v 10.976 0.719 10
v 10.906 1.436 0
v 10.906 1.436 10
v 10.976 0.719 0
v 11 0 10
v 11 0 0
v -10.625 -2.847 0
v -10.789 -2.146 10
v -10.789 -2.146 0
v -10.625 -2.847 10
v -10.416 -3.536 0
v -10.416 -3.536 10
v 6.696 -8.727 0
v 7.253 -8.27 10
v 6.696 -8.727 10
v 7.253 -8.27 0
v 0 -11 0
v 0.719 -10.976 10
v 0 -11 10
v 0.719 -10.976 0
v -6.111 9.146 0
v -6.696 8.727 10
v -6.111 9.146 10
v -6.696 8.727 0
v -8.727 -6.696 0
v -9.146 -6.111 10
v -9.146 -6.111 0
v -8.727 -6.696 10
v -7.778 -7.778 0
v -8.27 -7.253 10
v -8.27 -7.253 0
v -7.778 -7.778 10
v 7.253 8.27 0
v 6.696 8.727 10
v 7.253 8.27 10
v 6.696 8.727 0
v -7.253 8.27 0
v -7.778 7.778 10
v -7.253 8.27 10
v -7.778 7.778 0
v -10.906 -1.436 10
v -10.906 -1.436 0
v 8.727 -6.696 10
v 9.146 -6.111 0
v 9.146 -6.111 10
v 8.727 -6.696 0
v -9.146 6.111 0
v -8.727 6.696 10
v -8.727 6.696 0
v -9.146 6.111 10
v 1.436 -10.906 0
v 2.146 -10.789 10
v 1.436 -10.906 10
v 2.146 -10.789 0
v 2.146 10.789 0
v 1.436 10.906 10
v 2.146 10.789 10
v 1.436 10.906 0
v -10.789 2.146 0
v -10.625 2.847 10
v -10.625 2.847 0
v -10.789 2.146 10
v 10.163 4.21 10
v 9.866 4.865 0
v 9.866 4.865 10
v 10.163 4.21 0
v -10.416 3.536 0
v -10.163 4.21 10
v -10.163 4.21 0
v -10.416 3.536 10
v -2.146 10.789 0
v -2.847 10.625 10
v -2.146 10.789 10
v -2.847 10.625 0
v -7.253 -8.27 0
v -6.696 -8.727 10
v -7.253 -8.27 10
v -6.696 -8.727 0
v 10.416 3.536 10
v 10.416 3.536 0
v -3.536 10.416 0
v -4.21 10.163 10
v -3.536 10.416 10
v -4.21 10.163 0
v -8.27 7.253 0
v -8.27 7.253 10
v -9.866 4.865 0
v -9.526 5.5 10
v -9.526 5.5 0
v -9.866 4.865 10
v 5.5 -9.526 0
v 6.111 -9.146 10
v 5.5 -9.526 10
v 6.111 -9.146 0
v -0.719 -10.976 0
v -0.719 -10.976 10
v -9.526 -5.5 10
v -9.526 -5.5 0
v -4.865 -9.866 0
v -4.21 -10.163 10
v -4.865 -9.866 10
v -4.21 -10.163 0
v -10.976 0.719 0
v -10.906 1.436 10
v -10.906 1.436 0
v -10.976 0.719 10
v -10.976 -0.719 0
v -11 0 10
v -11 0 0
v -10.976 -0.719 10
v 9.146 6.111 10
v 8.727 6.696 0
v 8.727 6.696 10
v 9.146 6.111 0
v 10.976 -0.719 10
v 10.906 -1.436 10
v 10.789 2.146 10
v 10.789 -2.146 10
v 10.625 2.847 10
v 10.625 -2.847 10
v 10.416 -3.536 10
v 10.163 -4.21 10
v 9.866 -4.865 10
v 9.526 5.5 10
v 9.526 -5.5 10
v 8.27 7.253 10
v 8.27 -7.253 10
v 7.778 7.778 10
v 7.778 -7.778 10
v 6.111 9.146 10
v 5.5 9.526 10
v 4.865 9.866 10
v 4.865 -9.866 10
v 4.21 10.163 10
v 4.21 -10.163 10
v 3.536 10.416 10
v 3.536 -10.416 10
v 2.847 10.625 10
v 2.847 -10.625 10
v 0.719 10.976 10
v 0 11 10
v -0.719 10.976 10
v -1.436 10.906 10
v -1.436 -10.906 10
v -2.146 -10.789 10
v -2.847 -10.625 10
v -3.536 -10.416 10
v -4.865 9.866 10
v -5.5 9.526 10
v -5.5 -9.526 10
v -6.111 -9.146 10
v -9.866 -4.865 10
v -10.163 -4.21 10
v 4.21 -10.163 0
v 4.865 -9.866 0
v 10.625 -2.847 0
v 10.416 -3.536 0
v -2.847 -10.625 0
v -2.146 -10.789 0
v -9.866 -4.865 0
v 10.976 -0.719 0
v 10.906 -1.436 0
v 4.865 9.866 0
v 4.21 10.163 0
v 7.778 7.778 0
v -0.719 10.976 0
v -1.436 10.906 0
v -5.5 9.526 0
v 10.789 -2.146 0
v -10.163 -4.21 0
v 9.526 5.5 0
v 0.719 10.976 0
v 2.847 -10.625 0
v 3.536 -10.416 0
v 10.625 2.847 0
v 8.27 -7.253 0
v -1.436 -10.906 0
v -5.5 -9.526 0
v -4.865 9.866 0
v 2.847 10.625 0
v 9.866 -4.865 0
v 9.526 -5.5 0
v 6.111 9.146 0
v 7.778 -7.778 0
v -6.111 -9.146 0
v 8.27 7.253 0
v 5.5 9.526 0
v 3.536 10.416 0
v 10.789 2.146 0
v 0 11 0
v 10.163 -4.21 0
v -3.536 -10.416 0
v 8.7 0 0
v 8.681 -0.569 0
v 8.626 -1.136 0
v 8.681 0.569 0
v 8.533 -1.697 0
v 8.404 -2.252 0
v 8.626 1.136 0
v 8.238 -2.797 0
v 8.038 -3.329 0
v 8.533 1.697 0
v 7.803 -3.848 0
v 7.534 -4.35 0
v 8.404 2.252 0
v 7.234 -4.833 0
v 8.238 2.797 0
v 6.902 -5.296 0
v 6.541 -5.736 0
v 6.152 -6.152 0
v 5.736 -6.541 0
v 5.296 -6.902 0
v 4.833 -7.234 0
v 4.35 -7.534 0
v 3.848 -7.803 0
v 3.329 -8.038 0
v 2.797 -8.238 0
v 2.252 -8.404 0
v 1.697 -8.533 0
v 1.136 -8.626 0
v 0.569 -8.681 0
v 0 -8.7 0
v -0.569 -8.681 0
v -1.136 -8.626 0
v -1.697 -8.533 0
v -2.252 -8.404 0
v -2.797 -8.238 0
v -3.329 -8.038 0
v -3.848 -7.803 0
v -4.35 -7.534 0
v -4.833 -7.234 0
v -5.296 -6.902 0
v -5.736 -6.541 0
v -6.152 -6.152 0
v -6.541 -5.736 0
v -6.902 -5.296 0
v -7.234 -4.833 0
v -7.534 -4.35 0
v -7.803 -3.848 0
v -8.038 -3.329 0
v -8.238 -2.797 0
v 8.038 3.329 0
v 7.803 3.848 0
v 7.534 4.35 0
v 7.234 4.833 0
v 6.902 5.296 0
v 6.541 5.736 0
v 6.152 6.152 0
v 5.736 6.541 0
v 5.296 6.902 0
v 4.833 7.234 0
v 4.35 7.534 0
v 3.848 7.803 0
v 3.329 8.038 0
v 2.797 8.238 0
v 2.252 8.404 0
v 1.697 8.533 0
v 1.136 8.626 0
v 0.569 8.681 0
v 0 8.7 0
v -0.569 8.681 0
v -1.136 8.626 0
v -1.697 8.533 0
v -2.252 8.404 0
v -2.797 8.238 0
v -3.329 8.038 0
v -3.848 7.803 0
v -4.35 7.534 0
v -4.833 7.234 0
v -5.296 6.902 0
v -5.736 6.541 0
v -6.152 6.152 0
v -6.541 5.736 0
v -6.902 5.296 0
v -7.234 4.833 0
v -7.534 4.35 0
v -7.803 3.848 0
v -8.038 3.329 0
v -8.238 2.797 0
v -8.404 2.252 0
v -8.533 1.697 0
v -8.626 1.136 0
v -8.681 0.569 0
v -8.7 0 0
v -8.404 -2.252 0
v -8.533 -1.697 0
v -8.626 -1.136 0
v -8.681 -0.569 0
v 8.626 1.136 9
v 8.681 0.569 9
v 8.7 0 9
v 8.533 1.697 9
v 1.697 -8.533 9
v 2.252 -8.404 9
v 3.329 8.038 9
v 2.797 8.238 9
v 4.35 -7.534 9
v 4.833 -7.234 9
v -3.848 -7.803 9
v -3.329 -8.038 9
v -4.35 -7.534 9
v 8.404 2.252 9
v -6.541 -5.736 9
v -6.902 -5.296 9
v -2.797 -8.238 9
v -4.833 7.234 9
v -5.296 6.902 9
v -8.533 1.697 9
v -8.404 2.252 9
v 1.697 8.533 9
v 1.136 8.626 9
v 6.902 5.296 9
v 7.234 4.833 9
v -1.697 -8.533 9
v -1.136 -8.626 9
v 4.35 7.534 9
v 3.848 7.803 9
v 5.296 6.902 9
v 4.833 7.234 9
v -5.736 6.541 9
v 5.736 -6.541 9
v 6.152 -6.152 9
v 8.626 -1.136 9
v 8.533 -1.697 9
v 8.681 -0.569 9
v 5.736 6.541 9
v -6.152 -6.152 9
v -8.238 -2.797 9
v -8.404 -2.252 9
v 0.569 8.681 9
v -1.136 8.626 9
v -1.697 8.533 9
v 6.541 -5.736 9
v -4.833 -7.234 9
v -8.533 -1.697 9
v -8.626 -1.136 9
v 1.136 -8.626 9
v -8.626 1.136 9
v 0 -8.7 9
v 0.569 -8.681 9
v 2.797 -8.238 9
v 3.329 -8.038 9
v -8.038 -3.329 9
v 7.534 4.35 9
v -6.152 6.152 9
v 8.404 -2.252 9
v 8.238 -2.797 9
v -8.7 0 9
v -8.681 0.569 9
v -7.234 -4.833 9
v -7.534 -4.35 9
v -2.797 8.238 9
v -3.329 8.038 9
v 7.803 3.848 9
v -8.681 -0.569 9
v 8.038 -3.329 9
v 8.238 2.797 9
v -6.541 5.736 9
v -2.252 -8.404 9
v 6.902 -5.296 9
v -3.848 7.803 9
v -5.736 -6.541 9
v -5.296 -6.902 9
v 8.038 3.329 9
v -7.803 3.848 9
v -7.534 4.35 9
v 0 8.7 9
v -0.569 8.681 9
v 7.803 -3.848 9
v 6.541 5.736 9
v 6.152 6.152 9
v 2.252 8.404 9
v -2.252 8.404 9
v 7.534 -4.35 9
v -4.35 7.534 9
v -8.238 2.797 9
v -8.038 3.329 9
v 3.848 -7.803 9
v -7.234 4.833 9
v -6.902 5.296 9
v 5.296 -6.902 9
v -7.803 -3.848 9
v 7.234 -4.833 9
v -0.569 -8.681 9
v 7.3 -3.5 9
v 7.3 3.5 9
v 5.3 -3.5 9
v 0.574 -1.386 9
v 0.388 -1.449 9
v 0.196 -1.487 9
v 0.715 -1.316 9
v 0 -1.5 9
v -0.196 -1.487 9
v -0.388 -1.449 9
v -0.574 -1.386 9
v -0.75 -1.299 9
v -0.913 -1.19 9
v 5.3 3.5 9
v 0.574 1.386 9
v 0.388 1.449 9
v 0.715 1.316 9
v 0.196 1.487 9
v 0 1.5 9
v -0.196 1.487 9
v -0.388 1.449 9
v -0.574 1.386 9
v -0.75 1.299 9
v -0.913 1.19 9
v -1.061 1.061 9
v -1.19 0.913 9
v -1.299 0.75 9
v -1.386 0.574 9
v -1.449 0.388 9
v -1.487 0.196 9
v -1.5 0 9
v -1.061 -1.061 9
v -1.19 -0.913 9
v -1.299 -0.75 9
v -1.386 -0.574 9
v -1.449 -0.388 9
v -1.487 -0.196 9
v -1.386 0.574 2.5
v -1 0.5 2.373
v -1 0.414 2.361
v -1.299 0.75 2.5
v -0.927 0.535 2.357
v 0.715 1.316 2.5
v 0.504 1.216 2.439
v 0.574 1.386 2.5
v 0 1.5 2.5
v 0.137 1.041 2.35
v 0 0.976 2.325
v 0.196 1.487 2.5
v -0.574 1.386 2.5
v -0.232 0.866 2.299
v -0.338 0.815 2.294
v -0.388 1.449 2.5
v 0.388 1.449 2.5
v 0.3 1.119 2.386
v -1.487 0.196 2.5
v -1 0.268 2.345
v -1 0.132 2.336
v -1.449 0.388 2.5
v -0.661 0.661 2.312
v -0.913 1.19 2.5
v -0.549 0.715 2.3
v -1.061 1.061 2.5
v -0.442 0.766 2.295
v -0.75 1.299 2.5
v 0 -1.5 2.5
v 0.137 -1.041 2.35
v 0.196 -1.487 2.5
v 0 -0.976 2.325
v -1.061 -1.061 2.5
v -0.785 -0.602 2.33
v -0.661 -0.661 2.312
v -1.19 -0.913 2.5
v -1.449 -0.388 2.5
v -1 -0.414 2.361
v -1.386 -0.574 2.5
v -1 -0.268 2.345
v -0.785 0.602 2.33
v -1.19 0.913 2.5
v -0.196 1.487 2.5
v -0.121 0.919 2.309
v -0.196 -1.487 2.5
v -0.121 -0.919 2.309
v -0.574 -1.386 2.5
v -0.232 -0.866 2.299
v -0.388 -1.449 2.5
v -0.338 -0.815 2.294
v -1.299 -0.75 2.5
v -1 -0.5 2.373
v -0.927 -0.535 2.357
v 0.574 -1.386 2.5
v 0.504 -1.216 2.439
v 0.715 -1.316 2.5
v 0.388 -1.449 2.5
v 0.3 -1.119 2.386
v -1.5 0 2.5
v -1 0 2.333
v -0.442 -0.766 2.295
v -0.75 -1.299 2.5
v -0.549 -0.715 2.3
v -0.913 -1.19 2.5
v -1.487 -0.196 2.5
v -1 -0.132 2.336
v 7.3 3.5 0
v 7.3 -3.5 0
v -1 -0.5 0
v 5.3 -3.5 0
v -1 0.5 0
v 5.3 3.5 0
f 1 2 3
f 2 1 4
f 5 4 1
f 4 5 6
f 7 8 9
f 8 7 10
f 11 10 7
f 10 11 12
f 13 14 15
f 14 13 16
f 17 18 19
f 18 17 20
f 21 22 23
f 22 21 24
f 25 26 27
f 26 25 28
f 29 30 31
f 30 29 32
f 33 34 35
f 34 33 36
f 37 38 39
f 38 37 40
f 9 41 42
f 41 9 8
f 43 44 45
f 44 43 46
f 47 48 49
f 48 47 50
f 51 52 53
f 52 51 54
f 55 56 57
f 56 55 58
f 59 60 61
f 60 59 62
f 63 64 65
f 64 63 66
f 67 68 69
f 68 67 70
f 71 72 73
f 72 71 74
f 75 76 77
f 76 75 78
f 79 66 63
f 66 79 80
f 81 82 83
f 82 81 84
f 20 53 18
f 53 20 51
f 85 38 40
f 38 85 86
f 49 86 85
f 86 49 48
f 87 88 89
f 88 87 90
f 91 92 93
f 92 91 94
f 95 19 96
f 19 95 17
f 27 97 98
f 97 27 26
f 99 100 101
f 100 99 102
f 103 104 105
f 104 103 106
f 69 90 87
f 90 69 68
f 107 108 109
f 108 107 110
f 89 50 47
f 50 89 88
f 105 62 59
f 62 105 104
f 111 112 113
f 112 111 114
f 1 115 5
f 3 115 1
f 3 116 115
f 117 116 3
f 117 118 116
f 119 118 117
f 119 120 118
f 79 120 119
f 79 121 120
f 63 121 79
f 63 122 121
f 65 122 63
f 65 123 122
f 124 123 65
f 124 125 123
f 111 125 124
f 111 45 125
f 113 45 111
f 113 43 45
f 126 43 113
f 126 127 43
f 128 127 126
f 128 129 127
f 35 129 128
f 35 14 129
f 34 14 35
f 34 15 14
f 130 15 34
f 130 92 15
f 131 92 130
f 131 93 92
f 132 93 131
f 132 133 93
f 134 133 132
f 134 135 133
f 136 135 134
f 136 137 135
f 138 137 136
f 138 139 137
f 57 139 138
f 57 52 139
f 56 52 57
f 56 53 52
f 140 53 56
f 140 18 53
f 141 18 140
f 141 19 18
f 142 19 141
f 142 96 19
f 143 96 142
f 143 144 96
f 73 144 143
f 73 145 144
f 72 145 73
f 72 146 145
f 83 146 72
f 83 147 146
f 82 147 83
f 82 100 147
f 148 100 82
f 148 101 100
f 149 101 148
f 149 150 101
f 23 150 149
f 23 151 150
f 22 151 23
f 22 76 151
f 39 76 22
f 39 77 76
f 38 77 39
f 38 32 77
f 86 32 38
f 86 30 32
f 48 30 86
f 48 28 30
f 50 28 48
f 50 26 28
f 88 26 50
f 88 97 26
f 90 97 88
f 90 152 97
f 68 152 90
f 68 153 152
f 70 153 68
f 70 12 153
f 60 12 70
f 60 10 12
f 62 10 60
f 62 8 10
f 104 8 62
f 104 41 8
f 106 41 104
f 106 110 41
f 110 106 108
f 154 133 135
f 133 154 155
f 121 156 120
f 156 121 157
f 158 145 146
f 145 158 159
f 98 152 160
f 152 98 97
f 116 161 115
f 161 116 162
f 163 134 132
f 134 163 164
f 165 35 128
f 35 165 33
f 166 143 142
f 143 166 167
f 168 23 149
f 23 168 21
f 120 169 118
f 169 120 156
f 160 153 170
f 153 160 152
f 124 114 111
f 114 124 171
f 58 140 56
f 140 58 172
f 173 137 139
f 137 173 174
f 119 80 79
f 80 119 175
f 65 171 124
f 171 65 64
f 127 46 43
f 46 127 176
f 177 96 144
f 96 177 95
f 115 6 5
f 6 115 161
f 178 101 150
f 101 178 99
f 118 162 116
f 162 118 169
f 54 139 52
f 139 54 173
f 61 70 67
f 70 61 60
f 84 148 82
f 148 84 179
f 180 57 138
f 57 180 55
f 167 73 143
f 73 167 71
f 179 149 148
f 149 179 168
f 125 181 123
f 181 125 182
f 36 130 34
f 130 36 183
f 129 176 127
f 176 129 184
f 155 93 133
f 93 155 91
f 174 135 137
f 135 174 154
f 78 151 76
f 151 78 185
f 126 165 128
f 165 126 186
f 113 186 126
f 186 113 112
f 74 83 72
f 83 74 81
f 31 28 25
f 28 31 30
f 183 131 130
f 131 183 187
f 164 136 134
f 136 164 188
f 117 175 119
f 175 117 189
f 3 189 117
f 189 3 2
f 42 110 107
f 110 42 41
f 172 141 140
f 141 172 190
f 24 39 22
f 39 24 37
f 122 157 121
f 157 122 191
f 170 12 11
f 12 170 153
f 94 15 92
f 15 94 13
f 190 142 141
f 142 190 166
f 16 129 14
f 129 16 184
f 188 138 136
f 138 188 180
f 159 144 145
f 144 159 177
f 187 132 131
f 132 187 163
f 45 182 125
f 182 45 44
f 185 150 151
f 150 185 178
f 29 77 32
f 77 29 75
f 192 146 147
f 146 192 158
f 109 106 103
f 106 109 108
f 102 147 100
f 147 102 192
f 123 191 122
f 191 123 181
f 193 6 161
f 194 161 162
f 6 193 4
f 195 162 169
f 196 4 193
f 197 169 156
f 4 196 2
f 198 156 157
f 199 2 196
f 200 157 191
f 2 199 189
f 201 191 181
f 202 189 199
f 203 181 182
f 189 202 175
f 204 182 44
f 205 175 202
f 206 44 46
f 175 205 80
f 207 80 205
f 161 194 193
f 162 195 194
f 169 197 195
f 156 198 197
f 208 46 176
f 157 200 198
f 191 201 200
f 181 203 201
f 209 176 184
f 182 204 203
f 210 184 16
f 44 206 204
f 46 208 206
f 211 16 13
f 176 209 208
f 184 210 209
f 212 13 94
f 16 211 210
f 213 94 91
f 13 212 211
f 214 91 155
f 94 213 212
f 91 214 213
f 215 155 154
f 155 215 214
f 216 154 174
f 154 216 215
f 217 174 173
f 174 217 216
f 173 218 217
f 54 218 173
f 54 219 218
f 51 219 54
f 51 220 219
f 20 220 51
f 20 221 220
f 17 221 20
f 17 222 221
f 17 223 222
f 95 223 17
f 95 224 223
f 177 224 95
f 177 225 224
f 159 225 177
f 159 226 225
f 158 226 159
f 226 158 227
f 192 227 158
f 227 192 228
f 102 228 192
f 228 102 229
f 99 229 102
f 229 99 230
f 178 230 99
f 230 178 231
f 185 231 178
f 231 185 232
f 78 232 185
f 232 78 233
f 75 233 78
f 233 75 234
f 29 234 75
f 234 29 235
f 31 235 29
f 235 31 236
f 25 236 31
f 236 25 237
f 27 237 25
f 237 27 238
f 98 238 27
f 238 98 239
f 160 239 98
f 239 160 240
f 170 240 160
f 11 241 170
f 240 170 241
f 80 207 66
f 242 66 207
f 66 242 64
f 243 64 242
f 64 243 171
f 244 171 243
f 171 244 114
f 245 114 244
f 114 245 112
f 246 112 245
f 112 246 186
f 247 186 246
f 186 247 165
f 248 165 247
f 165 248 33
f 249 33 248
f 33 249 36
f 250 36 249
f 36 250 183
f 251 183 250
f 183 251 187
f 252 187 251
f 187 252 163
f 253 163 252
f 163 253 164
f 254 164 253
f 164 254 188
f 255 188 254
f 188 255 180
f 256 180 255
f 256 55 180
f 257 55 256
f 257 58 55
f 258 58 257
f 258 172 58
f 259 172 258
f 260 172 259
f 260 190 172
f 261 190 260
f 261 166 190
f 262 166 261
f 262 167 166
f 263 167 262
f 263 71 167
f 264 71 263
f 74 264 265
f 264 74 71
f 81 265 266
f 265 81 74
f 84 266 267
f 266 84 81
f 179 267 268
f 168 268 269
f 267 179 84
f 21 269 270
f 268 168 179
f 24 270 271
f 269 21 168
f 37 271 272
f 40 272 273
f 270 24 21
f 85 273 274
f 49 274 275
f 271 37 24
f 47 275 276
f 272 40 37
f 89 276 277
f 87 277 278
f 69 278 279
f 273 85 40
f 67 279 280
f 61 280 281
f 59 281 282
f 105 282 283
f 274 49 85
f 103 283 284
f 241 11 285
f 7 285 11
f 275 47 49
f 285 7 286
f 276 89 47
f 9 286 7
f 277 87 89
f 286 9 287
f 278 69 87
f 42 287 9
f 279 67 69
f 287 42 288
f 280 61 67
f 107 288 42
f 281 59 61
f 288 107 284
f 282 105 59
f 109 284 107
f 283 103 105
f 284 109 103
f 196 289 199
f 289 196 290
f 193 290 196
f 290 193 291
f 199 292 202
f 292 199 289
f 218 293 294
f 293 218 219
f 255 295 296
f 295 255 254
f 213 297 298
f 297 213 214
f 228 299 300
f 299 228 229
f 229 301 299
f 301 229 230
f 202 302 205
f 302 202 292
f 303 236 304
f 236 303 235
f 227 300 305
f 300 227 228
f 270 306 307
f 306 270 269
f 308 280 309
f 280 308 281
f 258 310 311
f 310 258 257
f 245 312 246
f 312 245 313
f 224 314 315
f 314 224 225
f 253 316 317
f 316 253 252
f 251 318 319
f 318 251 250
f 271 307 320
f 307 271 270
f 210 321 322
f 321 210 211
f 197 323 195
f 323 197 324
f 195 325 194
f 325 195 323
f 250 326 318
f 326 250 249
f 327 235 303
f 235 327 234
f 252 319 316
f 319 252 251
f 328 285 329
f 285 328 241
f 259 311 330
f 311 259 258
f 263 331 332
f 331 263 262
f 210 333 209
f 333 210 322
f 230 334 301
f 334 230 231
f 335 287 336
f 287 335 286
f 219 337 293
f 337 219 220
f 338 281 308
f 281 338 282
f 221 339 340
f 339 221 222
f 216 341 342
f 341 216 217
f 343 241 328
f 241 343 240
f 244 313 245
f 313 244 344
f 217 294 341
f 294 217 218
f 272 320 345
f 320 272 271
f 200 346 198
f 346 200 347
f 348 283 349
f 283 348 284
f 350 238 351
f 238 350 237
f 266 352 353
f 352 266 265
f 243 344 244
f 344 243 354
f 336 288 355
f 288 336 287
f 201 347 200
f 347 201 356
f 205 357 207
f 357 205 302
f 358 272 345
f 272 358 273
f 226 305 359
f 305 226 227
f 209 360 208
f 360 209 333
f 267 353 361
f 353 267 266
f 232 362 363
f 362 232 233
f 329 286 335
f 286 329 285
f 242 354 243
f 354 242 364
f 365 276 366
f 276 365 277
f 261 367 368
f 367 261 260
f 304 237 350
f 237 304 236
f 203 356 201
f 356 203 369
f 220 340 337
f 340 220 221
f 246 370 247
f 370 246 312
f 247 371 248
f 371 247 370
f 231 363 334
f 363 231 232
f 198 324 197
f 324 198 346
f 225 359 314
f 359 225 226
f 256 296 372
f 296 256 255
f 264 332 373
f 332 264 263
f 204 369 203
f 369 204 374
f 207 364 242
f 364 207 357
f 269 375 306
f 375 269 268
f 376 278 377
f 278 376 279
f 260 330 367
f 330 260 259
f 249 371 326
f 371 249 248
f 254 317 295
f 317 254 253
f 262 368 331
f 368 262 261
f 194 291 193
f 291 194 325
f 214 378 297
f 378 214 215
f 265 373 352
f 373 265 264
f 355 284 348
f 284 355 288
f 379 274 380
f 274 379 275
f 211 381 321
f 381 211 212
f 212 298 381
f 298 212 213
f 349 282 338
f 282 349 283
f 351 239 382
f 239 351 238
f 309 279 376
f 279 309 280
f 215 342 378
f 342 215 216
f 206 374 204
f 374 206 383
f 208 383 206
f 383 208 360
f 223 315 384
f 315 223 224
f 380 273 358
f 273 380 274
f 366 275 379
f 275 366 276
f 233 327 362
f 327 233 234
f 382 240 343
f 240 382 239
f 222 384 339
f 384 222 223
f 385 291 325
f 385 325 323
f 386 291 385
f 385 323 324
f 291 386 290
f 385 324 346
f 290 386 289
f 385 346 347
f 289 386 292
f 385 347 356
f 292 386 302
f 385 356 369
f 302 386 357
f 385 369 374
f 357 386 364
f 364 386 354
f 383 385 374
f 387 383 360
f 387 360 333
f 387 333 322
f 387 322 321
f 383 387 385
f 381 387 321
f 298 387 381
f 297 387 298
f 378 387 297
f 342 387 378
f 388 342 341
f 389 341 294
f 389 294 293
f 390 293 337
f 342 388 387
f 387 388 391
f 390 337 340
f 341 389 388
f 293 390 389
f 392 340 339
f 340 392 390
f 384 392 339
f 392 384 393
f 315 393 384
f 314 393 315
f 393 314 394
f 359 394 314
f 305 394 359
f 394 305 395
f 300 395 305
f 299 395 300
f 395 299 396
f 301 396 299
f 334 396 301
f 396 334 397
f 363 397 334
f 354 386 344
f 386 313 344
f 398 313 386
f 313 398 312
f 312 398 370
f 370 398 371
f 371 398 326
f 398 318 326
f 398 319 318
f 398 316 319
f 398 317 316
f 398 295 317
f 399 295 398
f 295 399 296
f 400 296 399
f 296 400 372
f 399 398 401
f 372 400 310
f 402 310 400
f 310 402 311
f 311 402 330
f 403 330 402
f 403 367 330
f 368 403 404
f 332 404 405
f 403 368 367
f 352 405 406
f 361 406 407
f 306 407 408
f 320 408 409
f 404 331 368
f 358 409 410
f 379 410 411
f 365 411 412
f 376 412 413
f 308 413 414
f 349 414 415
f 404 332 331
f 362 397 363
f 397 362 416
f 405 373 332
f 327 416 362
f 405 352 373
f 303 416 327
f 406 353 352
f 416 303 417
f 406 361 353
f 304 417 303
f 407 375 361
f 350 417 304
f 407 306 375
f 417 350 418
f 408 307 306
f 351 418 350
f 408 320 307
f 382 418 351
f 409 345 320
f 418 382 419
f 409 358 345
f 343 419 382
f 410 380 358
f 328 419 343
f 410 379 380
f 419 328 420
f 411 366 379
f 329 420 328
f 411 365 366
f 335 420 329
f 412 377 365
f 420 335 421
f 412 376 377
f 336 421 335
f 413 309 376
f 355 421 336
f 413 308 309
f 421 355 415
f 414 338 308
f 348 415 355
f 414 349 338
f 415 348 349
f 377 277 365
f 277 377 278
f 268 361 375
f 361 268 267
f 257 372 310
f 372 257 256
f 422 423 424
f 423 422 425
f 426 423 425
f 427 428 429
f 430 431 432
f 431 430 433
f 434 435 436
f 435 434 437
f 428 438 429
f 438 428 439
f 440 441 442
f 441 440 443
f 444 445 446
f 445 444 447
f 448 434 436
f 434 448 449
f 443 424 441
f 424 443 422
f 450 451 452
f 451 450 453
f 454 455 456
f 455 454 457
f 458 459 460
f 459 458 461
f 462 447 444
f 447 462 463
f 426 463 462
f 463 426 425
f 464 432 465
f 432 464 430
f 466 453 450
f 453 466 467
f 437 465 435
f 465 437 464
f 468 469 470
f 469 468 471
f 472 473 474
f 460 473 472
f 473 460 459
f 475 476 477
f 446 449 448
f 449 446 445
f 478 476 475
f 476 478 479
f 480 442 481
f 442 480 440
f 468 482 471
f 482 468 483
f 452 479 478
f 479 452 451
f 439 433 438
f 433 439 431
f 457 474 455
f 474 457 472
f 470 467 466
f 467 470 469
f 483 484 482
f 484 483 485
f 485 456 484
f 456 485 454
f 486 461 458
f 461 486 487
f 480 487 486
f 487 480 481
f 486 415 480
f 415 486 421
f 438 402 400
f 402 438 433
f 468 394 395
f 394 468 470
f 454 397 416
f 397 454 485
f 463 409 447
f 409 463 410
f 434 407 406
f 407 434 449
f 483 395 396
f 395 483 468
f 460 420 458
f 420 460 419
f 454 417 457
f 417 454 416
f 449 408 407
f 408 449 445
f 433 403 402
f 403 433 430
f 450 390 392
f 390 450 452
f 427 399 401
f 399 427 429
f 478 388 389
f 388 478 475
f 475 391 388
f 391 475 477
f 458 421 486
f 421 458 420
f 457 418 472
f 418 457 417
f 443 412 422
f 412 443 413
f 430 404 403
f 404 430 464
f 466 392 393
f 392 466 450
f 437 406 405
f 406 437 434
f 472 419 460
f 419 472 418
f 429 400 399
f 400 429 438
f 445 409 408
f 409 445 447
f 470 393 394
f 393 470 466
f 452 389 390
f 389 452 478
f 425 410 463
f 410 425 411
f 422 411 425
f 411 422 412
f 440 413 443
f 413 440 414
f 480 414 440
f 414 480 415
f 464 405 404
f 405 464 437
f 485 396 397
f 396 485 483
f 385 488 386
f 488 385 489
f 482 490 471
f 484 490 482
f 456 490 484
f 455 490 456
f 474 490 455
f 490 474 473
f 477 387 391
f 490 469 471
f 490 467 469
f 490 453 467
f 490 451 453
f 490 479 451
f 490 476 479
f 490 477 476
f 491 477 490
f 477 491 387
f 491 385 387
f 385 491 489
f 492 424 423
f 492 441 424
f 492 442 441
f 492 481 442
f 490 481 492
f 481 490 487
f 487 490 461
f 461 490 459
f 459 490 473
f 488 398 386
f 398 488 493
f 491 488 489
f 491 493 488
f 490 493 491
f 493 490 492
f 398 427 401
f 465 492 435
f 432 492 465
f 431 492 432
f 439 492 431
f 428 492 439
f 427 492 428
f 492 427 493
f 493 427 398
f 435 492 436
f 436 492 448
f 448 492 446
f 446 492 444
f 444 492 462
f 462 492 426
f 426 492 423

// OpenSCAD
// ----------------------------------------------------------------------------------------------------
// PROJECT INFORMATION

// NAME:  R/C Mower Trailer
// REVISION:  A1
// START DATE:  8/20/2021
// CURRENT VERSION DATE:  9/8/2021
// LICENSE:  GPLv3
// AUTHOR:  Justin Grimes (@zelon88)
// DESCRIPTION:  A tow-behind lawn mowing attachment for retrofit onto low-speed R/C vehicles.
// ----------------------------------------------------------------------------------------------------

// ----------------------------------------------------------------------------------------------------
// PART INFORMATION

// NAME:  Differential Output Yolk Cover
// REVISION:  A1
// START DATE:  7/20/2026
// CURRENT VERSION DATE:  7/20/2026
// AUTHOR:  Justin Grimes (@zelon88)
// DESCRIPTION:
//    The rotating cover that mates with the Differential_Output_Yolk drum.
//    Slips over the open face of the drum with 0.2mm radial clearance.
//    Outer radius is 2.5mm larger than the drum OD (r=8.5) giving r=11.0 (22mm OD).
//    Wall thickness is 2.3mm. The closed face carries the central support pin which
//    slides into the triple-stacked 3x5x2.5 bearings in the yolk drum. The pin is
//    added outside the main difference() block to prevent the inner bore subtraction
//    from removing it. Future additions: opposing trapezoid spring perch and 4 screw
//    slots that constrain the cover's rotational travel relative to the drum.
// FILE NAME: Differential_Output_Yolk_Cover.scad
// ----------------------------------------------------------------------------------------------------

// ----------------------------------------------------------------------------------------------------
// PRINTER CONFIGURATION
// [Printing instructions to be added]
// ----------------------------------------------------------------------------------------------------

// ----------------------------------------------------------------------------------------------------
// MANUFACTURING INSTRUCTIONS

// 1. Deburr all edges to break sharp edges.
// 2. Flip cover so closed face points down, pin pointing down into drum.
// 3. Slide pin into triple-stacked bearing hub in drum interior.
// 4. Align screw slots with drum cover screws.
// 5. Torque screws to preload springs and constrain axial movement.
// ----------------------------------------------------------------------------------------------------

// ----------------------------------------------------------------------------------------------------
// GEOMETRY

module Differential_Output_Yolk_Cover() {
  // Drum dimensions — must match Differential_Output_Yolk.scad.
  drum_r  = 8.5;   // Drum outer radius.
  drum_h  = 10;    // Drum height.

  // Cover dimensions.
  clearance     = 0.2;                     // Radial slip fit clearance over drum.
  cover_inner_r = drum_r + clearance;      // 8.7mm — clears drum OD.
  cover_outer_r = drum_r + 2.5;            // 11.0mm — 2.5mm larger than drum OD.
  cover_h       = drum_h;                  // Matches drum height.

  // Central support pin — slides into triple-stacked 3x5x2.5 bearings in the yolk drum.
  // Pin is added outside the main difference() so the inner bore does not subtract it.
  // The cover is flipped for installation; the Z=2 tip becomes the leading entry end.
  pin_r       = 1.5;   // Matches 3x5x2.5 bearing inner race ID.
  pin_h       = 7.5;   // Spans triple stacked bearings (3 x 2.5mm).
  pin_z       = 2;     // Z offset of pin base from cover bottom face.
  chamfer_h   = 0.5;   // Chamfer height on pin entry tip.

  // Cover shell — bore subtraction hollows the interior.
  difference() {
    cylinder($fn=96, r=cover_outer_r, h=cover_h, center=false);
    // Inner bore — open at Z=0 (entry side), leaves 1mm solid cap at Z=9 to Z=10.
    translate([0, 0, -1])
      cylinder($fn=96, r=cover_inner_r, h=cover_h, center=false); }

  // Opposing trapezoid spring perch — outside difference() to prevent bore from removing it.
  // rotate([0,90,0]) maps local Z → world X so the hull extends radially outward.
  // Far cube at local Z=6.3 → far edge at world X=7.3mm (0.2mm inside drum inner wall r=7.5mm).
  translate([0, 0, (cover_h / 2) - 0.5])
    rotate([0, 90, 0])
    hull() {
      cube([cover_h - 1, 1, 2], center=true);
      translate([0, 0, 6.3])
        cube([cover_h - 1, 7, 2], center=true); }

  // Central support pin with chamfered entry tip.
  // Built as cone (lead-in) + cylinder (body) — no subtraction needed.
  // When cover is flipped for installation, Z=pin_z becomes the leading tip.
  translate([0, 0, pin_z]) {
    // Lead-in chamfer — tapers from point at tip to full pin radius at chamfer_h.
    cylinder($fn=48, r1=0, r2=pin_r, h=chamfer_h, center=false);
    // Pin body — full radius from chamfer_h up to cap.
    translate([0, 0, chamfer_h])
      cylinder($fn=48, r=pin_r, h=pin_h - chamfer_h, center=false); } }

// Render the object.
// Comment or uncomment as needed.
//Differential_Output_Yolk_Cover();

// Render the object for printing.
// Comment or uncomment as needed.
Differential_Output_Yolk_Cover();
// ----------------------------------------------------------------------------------------------------
